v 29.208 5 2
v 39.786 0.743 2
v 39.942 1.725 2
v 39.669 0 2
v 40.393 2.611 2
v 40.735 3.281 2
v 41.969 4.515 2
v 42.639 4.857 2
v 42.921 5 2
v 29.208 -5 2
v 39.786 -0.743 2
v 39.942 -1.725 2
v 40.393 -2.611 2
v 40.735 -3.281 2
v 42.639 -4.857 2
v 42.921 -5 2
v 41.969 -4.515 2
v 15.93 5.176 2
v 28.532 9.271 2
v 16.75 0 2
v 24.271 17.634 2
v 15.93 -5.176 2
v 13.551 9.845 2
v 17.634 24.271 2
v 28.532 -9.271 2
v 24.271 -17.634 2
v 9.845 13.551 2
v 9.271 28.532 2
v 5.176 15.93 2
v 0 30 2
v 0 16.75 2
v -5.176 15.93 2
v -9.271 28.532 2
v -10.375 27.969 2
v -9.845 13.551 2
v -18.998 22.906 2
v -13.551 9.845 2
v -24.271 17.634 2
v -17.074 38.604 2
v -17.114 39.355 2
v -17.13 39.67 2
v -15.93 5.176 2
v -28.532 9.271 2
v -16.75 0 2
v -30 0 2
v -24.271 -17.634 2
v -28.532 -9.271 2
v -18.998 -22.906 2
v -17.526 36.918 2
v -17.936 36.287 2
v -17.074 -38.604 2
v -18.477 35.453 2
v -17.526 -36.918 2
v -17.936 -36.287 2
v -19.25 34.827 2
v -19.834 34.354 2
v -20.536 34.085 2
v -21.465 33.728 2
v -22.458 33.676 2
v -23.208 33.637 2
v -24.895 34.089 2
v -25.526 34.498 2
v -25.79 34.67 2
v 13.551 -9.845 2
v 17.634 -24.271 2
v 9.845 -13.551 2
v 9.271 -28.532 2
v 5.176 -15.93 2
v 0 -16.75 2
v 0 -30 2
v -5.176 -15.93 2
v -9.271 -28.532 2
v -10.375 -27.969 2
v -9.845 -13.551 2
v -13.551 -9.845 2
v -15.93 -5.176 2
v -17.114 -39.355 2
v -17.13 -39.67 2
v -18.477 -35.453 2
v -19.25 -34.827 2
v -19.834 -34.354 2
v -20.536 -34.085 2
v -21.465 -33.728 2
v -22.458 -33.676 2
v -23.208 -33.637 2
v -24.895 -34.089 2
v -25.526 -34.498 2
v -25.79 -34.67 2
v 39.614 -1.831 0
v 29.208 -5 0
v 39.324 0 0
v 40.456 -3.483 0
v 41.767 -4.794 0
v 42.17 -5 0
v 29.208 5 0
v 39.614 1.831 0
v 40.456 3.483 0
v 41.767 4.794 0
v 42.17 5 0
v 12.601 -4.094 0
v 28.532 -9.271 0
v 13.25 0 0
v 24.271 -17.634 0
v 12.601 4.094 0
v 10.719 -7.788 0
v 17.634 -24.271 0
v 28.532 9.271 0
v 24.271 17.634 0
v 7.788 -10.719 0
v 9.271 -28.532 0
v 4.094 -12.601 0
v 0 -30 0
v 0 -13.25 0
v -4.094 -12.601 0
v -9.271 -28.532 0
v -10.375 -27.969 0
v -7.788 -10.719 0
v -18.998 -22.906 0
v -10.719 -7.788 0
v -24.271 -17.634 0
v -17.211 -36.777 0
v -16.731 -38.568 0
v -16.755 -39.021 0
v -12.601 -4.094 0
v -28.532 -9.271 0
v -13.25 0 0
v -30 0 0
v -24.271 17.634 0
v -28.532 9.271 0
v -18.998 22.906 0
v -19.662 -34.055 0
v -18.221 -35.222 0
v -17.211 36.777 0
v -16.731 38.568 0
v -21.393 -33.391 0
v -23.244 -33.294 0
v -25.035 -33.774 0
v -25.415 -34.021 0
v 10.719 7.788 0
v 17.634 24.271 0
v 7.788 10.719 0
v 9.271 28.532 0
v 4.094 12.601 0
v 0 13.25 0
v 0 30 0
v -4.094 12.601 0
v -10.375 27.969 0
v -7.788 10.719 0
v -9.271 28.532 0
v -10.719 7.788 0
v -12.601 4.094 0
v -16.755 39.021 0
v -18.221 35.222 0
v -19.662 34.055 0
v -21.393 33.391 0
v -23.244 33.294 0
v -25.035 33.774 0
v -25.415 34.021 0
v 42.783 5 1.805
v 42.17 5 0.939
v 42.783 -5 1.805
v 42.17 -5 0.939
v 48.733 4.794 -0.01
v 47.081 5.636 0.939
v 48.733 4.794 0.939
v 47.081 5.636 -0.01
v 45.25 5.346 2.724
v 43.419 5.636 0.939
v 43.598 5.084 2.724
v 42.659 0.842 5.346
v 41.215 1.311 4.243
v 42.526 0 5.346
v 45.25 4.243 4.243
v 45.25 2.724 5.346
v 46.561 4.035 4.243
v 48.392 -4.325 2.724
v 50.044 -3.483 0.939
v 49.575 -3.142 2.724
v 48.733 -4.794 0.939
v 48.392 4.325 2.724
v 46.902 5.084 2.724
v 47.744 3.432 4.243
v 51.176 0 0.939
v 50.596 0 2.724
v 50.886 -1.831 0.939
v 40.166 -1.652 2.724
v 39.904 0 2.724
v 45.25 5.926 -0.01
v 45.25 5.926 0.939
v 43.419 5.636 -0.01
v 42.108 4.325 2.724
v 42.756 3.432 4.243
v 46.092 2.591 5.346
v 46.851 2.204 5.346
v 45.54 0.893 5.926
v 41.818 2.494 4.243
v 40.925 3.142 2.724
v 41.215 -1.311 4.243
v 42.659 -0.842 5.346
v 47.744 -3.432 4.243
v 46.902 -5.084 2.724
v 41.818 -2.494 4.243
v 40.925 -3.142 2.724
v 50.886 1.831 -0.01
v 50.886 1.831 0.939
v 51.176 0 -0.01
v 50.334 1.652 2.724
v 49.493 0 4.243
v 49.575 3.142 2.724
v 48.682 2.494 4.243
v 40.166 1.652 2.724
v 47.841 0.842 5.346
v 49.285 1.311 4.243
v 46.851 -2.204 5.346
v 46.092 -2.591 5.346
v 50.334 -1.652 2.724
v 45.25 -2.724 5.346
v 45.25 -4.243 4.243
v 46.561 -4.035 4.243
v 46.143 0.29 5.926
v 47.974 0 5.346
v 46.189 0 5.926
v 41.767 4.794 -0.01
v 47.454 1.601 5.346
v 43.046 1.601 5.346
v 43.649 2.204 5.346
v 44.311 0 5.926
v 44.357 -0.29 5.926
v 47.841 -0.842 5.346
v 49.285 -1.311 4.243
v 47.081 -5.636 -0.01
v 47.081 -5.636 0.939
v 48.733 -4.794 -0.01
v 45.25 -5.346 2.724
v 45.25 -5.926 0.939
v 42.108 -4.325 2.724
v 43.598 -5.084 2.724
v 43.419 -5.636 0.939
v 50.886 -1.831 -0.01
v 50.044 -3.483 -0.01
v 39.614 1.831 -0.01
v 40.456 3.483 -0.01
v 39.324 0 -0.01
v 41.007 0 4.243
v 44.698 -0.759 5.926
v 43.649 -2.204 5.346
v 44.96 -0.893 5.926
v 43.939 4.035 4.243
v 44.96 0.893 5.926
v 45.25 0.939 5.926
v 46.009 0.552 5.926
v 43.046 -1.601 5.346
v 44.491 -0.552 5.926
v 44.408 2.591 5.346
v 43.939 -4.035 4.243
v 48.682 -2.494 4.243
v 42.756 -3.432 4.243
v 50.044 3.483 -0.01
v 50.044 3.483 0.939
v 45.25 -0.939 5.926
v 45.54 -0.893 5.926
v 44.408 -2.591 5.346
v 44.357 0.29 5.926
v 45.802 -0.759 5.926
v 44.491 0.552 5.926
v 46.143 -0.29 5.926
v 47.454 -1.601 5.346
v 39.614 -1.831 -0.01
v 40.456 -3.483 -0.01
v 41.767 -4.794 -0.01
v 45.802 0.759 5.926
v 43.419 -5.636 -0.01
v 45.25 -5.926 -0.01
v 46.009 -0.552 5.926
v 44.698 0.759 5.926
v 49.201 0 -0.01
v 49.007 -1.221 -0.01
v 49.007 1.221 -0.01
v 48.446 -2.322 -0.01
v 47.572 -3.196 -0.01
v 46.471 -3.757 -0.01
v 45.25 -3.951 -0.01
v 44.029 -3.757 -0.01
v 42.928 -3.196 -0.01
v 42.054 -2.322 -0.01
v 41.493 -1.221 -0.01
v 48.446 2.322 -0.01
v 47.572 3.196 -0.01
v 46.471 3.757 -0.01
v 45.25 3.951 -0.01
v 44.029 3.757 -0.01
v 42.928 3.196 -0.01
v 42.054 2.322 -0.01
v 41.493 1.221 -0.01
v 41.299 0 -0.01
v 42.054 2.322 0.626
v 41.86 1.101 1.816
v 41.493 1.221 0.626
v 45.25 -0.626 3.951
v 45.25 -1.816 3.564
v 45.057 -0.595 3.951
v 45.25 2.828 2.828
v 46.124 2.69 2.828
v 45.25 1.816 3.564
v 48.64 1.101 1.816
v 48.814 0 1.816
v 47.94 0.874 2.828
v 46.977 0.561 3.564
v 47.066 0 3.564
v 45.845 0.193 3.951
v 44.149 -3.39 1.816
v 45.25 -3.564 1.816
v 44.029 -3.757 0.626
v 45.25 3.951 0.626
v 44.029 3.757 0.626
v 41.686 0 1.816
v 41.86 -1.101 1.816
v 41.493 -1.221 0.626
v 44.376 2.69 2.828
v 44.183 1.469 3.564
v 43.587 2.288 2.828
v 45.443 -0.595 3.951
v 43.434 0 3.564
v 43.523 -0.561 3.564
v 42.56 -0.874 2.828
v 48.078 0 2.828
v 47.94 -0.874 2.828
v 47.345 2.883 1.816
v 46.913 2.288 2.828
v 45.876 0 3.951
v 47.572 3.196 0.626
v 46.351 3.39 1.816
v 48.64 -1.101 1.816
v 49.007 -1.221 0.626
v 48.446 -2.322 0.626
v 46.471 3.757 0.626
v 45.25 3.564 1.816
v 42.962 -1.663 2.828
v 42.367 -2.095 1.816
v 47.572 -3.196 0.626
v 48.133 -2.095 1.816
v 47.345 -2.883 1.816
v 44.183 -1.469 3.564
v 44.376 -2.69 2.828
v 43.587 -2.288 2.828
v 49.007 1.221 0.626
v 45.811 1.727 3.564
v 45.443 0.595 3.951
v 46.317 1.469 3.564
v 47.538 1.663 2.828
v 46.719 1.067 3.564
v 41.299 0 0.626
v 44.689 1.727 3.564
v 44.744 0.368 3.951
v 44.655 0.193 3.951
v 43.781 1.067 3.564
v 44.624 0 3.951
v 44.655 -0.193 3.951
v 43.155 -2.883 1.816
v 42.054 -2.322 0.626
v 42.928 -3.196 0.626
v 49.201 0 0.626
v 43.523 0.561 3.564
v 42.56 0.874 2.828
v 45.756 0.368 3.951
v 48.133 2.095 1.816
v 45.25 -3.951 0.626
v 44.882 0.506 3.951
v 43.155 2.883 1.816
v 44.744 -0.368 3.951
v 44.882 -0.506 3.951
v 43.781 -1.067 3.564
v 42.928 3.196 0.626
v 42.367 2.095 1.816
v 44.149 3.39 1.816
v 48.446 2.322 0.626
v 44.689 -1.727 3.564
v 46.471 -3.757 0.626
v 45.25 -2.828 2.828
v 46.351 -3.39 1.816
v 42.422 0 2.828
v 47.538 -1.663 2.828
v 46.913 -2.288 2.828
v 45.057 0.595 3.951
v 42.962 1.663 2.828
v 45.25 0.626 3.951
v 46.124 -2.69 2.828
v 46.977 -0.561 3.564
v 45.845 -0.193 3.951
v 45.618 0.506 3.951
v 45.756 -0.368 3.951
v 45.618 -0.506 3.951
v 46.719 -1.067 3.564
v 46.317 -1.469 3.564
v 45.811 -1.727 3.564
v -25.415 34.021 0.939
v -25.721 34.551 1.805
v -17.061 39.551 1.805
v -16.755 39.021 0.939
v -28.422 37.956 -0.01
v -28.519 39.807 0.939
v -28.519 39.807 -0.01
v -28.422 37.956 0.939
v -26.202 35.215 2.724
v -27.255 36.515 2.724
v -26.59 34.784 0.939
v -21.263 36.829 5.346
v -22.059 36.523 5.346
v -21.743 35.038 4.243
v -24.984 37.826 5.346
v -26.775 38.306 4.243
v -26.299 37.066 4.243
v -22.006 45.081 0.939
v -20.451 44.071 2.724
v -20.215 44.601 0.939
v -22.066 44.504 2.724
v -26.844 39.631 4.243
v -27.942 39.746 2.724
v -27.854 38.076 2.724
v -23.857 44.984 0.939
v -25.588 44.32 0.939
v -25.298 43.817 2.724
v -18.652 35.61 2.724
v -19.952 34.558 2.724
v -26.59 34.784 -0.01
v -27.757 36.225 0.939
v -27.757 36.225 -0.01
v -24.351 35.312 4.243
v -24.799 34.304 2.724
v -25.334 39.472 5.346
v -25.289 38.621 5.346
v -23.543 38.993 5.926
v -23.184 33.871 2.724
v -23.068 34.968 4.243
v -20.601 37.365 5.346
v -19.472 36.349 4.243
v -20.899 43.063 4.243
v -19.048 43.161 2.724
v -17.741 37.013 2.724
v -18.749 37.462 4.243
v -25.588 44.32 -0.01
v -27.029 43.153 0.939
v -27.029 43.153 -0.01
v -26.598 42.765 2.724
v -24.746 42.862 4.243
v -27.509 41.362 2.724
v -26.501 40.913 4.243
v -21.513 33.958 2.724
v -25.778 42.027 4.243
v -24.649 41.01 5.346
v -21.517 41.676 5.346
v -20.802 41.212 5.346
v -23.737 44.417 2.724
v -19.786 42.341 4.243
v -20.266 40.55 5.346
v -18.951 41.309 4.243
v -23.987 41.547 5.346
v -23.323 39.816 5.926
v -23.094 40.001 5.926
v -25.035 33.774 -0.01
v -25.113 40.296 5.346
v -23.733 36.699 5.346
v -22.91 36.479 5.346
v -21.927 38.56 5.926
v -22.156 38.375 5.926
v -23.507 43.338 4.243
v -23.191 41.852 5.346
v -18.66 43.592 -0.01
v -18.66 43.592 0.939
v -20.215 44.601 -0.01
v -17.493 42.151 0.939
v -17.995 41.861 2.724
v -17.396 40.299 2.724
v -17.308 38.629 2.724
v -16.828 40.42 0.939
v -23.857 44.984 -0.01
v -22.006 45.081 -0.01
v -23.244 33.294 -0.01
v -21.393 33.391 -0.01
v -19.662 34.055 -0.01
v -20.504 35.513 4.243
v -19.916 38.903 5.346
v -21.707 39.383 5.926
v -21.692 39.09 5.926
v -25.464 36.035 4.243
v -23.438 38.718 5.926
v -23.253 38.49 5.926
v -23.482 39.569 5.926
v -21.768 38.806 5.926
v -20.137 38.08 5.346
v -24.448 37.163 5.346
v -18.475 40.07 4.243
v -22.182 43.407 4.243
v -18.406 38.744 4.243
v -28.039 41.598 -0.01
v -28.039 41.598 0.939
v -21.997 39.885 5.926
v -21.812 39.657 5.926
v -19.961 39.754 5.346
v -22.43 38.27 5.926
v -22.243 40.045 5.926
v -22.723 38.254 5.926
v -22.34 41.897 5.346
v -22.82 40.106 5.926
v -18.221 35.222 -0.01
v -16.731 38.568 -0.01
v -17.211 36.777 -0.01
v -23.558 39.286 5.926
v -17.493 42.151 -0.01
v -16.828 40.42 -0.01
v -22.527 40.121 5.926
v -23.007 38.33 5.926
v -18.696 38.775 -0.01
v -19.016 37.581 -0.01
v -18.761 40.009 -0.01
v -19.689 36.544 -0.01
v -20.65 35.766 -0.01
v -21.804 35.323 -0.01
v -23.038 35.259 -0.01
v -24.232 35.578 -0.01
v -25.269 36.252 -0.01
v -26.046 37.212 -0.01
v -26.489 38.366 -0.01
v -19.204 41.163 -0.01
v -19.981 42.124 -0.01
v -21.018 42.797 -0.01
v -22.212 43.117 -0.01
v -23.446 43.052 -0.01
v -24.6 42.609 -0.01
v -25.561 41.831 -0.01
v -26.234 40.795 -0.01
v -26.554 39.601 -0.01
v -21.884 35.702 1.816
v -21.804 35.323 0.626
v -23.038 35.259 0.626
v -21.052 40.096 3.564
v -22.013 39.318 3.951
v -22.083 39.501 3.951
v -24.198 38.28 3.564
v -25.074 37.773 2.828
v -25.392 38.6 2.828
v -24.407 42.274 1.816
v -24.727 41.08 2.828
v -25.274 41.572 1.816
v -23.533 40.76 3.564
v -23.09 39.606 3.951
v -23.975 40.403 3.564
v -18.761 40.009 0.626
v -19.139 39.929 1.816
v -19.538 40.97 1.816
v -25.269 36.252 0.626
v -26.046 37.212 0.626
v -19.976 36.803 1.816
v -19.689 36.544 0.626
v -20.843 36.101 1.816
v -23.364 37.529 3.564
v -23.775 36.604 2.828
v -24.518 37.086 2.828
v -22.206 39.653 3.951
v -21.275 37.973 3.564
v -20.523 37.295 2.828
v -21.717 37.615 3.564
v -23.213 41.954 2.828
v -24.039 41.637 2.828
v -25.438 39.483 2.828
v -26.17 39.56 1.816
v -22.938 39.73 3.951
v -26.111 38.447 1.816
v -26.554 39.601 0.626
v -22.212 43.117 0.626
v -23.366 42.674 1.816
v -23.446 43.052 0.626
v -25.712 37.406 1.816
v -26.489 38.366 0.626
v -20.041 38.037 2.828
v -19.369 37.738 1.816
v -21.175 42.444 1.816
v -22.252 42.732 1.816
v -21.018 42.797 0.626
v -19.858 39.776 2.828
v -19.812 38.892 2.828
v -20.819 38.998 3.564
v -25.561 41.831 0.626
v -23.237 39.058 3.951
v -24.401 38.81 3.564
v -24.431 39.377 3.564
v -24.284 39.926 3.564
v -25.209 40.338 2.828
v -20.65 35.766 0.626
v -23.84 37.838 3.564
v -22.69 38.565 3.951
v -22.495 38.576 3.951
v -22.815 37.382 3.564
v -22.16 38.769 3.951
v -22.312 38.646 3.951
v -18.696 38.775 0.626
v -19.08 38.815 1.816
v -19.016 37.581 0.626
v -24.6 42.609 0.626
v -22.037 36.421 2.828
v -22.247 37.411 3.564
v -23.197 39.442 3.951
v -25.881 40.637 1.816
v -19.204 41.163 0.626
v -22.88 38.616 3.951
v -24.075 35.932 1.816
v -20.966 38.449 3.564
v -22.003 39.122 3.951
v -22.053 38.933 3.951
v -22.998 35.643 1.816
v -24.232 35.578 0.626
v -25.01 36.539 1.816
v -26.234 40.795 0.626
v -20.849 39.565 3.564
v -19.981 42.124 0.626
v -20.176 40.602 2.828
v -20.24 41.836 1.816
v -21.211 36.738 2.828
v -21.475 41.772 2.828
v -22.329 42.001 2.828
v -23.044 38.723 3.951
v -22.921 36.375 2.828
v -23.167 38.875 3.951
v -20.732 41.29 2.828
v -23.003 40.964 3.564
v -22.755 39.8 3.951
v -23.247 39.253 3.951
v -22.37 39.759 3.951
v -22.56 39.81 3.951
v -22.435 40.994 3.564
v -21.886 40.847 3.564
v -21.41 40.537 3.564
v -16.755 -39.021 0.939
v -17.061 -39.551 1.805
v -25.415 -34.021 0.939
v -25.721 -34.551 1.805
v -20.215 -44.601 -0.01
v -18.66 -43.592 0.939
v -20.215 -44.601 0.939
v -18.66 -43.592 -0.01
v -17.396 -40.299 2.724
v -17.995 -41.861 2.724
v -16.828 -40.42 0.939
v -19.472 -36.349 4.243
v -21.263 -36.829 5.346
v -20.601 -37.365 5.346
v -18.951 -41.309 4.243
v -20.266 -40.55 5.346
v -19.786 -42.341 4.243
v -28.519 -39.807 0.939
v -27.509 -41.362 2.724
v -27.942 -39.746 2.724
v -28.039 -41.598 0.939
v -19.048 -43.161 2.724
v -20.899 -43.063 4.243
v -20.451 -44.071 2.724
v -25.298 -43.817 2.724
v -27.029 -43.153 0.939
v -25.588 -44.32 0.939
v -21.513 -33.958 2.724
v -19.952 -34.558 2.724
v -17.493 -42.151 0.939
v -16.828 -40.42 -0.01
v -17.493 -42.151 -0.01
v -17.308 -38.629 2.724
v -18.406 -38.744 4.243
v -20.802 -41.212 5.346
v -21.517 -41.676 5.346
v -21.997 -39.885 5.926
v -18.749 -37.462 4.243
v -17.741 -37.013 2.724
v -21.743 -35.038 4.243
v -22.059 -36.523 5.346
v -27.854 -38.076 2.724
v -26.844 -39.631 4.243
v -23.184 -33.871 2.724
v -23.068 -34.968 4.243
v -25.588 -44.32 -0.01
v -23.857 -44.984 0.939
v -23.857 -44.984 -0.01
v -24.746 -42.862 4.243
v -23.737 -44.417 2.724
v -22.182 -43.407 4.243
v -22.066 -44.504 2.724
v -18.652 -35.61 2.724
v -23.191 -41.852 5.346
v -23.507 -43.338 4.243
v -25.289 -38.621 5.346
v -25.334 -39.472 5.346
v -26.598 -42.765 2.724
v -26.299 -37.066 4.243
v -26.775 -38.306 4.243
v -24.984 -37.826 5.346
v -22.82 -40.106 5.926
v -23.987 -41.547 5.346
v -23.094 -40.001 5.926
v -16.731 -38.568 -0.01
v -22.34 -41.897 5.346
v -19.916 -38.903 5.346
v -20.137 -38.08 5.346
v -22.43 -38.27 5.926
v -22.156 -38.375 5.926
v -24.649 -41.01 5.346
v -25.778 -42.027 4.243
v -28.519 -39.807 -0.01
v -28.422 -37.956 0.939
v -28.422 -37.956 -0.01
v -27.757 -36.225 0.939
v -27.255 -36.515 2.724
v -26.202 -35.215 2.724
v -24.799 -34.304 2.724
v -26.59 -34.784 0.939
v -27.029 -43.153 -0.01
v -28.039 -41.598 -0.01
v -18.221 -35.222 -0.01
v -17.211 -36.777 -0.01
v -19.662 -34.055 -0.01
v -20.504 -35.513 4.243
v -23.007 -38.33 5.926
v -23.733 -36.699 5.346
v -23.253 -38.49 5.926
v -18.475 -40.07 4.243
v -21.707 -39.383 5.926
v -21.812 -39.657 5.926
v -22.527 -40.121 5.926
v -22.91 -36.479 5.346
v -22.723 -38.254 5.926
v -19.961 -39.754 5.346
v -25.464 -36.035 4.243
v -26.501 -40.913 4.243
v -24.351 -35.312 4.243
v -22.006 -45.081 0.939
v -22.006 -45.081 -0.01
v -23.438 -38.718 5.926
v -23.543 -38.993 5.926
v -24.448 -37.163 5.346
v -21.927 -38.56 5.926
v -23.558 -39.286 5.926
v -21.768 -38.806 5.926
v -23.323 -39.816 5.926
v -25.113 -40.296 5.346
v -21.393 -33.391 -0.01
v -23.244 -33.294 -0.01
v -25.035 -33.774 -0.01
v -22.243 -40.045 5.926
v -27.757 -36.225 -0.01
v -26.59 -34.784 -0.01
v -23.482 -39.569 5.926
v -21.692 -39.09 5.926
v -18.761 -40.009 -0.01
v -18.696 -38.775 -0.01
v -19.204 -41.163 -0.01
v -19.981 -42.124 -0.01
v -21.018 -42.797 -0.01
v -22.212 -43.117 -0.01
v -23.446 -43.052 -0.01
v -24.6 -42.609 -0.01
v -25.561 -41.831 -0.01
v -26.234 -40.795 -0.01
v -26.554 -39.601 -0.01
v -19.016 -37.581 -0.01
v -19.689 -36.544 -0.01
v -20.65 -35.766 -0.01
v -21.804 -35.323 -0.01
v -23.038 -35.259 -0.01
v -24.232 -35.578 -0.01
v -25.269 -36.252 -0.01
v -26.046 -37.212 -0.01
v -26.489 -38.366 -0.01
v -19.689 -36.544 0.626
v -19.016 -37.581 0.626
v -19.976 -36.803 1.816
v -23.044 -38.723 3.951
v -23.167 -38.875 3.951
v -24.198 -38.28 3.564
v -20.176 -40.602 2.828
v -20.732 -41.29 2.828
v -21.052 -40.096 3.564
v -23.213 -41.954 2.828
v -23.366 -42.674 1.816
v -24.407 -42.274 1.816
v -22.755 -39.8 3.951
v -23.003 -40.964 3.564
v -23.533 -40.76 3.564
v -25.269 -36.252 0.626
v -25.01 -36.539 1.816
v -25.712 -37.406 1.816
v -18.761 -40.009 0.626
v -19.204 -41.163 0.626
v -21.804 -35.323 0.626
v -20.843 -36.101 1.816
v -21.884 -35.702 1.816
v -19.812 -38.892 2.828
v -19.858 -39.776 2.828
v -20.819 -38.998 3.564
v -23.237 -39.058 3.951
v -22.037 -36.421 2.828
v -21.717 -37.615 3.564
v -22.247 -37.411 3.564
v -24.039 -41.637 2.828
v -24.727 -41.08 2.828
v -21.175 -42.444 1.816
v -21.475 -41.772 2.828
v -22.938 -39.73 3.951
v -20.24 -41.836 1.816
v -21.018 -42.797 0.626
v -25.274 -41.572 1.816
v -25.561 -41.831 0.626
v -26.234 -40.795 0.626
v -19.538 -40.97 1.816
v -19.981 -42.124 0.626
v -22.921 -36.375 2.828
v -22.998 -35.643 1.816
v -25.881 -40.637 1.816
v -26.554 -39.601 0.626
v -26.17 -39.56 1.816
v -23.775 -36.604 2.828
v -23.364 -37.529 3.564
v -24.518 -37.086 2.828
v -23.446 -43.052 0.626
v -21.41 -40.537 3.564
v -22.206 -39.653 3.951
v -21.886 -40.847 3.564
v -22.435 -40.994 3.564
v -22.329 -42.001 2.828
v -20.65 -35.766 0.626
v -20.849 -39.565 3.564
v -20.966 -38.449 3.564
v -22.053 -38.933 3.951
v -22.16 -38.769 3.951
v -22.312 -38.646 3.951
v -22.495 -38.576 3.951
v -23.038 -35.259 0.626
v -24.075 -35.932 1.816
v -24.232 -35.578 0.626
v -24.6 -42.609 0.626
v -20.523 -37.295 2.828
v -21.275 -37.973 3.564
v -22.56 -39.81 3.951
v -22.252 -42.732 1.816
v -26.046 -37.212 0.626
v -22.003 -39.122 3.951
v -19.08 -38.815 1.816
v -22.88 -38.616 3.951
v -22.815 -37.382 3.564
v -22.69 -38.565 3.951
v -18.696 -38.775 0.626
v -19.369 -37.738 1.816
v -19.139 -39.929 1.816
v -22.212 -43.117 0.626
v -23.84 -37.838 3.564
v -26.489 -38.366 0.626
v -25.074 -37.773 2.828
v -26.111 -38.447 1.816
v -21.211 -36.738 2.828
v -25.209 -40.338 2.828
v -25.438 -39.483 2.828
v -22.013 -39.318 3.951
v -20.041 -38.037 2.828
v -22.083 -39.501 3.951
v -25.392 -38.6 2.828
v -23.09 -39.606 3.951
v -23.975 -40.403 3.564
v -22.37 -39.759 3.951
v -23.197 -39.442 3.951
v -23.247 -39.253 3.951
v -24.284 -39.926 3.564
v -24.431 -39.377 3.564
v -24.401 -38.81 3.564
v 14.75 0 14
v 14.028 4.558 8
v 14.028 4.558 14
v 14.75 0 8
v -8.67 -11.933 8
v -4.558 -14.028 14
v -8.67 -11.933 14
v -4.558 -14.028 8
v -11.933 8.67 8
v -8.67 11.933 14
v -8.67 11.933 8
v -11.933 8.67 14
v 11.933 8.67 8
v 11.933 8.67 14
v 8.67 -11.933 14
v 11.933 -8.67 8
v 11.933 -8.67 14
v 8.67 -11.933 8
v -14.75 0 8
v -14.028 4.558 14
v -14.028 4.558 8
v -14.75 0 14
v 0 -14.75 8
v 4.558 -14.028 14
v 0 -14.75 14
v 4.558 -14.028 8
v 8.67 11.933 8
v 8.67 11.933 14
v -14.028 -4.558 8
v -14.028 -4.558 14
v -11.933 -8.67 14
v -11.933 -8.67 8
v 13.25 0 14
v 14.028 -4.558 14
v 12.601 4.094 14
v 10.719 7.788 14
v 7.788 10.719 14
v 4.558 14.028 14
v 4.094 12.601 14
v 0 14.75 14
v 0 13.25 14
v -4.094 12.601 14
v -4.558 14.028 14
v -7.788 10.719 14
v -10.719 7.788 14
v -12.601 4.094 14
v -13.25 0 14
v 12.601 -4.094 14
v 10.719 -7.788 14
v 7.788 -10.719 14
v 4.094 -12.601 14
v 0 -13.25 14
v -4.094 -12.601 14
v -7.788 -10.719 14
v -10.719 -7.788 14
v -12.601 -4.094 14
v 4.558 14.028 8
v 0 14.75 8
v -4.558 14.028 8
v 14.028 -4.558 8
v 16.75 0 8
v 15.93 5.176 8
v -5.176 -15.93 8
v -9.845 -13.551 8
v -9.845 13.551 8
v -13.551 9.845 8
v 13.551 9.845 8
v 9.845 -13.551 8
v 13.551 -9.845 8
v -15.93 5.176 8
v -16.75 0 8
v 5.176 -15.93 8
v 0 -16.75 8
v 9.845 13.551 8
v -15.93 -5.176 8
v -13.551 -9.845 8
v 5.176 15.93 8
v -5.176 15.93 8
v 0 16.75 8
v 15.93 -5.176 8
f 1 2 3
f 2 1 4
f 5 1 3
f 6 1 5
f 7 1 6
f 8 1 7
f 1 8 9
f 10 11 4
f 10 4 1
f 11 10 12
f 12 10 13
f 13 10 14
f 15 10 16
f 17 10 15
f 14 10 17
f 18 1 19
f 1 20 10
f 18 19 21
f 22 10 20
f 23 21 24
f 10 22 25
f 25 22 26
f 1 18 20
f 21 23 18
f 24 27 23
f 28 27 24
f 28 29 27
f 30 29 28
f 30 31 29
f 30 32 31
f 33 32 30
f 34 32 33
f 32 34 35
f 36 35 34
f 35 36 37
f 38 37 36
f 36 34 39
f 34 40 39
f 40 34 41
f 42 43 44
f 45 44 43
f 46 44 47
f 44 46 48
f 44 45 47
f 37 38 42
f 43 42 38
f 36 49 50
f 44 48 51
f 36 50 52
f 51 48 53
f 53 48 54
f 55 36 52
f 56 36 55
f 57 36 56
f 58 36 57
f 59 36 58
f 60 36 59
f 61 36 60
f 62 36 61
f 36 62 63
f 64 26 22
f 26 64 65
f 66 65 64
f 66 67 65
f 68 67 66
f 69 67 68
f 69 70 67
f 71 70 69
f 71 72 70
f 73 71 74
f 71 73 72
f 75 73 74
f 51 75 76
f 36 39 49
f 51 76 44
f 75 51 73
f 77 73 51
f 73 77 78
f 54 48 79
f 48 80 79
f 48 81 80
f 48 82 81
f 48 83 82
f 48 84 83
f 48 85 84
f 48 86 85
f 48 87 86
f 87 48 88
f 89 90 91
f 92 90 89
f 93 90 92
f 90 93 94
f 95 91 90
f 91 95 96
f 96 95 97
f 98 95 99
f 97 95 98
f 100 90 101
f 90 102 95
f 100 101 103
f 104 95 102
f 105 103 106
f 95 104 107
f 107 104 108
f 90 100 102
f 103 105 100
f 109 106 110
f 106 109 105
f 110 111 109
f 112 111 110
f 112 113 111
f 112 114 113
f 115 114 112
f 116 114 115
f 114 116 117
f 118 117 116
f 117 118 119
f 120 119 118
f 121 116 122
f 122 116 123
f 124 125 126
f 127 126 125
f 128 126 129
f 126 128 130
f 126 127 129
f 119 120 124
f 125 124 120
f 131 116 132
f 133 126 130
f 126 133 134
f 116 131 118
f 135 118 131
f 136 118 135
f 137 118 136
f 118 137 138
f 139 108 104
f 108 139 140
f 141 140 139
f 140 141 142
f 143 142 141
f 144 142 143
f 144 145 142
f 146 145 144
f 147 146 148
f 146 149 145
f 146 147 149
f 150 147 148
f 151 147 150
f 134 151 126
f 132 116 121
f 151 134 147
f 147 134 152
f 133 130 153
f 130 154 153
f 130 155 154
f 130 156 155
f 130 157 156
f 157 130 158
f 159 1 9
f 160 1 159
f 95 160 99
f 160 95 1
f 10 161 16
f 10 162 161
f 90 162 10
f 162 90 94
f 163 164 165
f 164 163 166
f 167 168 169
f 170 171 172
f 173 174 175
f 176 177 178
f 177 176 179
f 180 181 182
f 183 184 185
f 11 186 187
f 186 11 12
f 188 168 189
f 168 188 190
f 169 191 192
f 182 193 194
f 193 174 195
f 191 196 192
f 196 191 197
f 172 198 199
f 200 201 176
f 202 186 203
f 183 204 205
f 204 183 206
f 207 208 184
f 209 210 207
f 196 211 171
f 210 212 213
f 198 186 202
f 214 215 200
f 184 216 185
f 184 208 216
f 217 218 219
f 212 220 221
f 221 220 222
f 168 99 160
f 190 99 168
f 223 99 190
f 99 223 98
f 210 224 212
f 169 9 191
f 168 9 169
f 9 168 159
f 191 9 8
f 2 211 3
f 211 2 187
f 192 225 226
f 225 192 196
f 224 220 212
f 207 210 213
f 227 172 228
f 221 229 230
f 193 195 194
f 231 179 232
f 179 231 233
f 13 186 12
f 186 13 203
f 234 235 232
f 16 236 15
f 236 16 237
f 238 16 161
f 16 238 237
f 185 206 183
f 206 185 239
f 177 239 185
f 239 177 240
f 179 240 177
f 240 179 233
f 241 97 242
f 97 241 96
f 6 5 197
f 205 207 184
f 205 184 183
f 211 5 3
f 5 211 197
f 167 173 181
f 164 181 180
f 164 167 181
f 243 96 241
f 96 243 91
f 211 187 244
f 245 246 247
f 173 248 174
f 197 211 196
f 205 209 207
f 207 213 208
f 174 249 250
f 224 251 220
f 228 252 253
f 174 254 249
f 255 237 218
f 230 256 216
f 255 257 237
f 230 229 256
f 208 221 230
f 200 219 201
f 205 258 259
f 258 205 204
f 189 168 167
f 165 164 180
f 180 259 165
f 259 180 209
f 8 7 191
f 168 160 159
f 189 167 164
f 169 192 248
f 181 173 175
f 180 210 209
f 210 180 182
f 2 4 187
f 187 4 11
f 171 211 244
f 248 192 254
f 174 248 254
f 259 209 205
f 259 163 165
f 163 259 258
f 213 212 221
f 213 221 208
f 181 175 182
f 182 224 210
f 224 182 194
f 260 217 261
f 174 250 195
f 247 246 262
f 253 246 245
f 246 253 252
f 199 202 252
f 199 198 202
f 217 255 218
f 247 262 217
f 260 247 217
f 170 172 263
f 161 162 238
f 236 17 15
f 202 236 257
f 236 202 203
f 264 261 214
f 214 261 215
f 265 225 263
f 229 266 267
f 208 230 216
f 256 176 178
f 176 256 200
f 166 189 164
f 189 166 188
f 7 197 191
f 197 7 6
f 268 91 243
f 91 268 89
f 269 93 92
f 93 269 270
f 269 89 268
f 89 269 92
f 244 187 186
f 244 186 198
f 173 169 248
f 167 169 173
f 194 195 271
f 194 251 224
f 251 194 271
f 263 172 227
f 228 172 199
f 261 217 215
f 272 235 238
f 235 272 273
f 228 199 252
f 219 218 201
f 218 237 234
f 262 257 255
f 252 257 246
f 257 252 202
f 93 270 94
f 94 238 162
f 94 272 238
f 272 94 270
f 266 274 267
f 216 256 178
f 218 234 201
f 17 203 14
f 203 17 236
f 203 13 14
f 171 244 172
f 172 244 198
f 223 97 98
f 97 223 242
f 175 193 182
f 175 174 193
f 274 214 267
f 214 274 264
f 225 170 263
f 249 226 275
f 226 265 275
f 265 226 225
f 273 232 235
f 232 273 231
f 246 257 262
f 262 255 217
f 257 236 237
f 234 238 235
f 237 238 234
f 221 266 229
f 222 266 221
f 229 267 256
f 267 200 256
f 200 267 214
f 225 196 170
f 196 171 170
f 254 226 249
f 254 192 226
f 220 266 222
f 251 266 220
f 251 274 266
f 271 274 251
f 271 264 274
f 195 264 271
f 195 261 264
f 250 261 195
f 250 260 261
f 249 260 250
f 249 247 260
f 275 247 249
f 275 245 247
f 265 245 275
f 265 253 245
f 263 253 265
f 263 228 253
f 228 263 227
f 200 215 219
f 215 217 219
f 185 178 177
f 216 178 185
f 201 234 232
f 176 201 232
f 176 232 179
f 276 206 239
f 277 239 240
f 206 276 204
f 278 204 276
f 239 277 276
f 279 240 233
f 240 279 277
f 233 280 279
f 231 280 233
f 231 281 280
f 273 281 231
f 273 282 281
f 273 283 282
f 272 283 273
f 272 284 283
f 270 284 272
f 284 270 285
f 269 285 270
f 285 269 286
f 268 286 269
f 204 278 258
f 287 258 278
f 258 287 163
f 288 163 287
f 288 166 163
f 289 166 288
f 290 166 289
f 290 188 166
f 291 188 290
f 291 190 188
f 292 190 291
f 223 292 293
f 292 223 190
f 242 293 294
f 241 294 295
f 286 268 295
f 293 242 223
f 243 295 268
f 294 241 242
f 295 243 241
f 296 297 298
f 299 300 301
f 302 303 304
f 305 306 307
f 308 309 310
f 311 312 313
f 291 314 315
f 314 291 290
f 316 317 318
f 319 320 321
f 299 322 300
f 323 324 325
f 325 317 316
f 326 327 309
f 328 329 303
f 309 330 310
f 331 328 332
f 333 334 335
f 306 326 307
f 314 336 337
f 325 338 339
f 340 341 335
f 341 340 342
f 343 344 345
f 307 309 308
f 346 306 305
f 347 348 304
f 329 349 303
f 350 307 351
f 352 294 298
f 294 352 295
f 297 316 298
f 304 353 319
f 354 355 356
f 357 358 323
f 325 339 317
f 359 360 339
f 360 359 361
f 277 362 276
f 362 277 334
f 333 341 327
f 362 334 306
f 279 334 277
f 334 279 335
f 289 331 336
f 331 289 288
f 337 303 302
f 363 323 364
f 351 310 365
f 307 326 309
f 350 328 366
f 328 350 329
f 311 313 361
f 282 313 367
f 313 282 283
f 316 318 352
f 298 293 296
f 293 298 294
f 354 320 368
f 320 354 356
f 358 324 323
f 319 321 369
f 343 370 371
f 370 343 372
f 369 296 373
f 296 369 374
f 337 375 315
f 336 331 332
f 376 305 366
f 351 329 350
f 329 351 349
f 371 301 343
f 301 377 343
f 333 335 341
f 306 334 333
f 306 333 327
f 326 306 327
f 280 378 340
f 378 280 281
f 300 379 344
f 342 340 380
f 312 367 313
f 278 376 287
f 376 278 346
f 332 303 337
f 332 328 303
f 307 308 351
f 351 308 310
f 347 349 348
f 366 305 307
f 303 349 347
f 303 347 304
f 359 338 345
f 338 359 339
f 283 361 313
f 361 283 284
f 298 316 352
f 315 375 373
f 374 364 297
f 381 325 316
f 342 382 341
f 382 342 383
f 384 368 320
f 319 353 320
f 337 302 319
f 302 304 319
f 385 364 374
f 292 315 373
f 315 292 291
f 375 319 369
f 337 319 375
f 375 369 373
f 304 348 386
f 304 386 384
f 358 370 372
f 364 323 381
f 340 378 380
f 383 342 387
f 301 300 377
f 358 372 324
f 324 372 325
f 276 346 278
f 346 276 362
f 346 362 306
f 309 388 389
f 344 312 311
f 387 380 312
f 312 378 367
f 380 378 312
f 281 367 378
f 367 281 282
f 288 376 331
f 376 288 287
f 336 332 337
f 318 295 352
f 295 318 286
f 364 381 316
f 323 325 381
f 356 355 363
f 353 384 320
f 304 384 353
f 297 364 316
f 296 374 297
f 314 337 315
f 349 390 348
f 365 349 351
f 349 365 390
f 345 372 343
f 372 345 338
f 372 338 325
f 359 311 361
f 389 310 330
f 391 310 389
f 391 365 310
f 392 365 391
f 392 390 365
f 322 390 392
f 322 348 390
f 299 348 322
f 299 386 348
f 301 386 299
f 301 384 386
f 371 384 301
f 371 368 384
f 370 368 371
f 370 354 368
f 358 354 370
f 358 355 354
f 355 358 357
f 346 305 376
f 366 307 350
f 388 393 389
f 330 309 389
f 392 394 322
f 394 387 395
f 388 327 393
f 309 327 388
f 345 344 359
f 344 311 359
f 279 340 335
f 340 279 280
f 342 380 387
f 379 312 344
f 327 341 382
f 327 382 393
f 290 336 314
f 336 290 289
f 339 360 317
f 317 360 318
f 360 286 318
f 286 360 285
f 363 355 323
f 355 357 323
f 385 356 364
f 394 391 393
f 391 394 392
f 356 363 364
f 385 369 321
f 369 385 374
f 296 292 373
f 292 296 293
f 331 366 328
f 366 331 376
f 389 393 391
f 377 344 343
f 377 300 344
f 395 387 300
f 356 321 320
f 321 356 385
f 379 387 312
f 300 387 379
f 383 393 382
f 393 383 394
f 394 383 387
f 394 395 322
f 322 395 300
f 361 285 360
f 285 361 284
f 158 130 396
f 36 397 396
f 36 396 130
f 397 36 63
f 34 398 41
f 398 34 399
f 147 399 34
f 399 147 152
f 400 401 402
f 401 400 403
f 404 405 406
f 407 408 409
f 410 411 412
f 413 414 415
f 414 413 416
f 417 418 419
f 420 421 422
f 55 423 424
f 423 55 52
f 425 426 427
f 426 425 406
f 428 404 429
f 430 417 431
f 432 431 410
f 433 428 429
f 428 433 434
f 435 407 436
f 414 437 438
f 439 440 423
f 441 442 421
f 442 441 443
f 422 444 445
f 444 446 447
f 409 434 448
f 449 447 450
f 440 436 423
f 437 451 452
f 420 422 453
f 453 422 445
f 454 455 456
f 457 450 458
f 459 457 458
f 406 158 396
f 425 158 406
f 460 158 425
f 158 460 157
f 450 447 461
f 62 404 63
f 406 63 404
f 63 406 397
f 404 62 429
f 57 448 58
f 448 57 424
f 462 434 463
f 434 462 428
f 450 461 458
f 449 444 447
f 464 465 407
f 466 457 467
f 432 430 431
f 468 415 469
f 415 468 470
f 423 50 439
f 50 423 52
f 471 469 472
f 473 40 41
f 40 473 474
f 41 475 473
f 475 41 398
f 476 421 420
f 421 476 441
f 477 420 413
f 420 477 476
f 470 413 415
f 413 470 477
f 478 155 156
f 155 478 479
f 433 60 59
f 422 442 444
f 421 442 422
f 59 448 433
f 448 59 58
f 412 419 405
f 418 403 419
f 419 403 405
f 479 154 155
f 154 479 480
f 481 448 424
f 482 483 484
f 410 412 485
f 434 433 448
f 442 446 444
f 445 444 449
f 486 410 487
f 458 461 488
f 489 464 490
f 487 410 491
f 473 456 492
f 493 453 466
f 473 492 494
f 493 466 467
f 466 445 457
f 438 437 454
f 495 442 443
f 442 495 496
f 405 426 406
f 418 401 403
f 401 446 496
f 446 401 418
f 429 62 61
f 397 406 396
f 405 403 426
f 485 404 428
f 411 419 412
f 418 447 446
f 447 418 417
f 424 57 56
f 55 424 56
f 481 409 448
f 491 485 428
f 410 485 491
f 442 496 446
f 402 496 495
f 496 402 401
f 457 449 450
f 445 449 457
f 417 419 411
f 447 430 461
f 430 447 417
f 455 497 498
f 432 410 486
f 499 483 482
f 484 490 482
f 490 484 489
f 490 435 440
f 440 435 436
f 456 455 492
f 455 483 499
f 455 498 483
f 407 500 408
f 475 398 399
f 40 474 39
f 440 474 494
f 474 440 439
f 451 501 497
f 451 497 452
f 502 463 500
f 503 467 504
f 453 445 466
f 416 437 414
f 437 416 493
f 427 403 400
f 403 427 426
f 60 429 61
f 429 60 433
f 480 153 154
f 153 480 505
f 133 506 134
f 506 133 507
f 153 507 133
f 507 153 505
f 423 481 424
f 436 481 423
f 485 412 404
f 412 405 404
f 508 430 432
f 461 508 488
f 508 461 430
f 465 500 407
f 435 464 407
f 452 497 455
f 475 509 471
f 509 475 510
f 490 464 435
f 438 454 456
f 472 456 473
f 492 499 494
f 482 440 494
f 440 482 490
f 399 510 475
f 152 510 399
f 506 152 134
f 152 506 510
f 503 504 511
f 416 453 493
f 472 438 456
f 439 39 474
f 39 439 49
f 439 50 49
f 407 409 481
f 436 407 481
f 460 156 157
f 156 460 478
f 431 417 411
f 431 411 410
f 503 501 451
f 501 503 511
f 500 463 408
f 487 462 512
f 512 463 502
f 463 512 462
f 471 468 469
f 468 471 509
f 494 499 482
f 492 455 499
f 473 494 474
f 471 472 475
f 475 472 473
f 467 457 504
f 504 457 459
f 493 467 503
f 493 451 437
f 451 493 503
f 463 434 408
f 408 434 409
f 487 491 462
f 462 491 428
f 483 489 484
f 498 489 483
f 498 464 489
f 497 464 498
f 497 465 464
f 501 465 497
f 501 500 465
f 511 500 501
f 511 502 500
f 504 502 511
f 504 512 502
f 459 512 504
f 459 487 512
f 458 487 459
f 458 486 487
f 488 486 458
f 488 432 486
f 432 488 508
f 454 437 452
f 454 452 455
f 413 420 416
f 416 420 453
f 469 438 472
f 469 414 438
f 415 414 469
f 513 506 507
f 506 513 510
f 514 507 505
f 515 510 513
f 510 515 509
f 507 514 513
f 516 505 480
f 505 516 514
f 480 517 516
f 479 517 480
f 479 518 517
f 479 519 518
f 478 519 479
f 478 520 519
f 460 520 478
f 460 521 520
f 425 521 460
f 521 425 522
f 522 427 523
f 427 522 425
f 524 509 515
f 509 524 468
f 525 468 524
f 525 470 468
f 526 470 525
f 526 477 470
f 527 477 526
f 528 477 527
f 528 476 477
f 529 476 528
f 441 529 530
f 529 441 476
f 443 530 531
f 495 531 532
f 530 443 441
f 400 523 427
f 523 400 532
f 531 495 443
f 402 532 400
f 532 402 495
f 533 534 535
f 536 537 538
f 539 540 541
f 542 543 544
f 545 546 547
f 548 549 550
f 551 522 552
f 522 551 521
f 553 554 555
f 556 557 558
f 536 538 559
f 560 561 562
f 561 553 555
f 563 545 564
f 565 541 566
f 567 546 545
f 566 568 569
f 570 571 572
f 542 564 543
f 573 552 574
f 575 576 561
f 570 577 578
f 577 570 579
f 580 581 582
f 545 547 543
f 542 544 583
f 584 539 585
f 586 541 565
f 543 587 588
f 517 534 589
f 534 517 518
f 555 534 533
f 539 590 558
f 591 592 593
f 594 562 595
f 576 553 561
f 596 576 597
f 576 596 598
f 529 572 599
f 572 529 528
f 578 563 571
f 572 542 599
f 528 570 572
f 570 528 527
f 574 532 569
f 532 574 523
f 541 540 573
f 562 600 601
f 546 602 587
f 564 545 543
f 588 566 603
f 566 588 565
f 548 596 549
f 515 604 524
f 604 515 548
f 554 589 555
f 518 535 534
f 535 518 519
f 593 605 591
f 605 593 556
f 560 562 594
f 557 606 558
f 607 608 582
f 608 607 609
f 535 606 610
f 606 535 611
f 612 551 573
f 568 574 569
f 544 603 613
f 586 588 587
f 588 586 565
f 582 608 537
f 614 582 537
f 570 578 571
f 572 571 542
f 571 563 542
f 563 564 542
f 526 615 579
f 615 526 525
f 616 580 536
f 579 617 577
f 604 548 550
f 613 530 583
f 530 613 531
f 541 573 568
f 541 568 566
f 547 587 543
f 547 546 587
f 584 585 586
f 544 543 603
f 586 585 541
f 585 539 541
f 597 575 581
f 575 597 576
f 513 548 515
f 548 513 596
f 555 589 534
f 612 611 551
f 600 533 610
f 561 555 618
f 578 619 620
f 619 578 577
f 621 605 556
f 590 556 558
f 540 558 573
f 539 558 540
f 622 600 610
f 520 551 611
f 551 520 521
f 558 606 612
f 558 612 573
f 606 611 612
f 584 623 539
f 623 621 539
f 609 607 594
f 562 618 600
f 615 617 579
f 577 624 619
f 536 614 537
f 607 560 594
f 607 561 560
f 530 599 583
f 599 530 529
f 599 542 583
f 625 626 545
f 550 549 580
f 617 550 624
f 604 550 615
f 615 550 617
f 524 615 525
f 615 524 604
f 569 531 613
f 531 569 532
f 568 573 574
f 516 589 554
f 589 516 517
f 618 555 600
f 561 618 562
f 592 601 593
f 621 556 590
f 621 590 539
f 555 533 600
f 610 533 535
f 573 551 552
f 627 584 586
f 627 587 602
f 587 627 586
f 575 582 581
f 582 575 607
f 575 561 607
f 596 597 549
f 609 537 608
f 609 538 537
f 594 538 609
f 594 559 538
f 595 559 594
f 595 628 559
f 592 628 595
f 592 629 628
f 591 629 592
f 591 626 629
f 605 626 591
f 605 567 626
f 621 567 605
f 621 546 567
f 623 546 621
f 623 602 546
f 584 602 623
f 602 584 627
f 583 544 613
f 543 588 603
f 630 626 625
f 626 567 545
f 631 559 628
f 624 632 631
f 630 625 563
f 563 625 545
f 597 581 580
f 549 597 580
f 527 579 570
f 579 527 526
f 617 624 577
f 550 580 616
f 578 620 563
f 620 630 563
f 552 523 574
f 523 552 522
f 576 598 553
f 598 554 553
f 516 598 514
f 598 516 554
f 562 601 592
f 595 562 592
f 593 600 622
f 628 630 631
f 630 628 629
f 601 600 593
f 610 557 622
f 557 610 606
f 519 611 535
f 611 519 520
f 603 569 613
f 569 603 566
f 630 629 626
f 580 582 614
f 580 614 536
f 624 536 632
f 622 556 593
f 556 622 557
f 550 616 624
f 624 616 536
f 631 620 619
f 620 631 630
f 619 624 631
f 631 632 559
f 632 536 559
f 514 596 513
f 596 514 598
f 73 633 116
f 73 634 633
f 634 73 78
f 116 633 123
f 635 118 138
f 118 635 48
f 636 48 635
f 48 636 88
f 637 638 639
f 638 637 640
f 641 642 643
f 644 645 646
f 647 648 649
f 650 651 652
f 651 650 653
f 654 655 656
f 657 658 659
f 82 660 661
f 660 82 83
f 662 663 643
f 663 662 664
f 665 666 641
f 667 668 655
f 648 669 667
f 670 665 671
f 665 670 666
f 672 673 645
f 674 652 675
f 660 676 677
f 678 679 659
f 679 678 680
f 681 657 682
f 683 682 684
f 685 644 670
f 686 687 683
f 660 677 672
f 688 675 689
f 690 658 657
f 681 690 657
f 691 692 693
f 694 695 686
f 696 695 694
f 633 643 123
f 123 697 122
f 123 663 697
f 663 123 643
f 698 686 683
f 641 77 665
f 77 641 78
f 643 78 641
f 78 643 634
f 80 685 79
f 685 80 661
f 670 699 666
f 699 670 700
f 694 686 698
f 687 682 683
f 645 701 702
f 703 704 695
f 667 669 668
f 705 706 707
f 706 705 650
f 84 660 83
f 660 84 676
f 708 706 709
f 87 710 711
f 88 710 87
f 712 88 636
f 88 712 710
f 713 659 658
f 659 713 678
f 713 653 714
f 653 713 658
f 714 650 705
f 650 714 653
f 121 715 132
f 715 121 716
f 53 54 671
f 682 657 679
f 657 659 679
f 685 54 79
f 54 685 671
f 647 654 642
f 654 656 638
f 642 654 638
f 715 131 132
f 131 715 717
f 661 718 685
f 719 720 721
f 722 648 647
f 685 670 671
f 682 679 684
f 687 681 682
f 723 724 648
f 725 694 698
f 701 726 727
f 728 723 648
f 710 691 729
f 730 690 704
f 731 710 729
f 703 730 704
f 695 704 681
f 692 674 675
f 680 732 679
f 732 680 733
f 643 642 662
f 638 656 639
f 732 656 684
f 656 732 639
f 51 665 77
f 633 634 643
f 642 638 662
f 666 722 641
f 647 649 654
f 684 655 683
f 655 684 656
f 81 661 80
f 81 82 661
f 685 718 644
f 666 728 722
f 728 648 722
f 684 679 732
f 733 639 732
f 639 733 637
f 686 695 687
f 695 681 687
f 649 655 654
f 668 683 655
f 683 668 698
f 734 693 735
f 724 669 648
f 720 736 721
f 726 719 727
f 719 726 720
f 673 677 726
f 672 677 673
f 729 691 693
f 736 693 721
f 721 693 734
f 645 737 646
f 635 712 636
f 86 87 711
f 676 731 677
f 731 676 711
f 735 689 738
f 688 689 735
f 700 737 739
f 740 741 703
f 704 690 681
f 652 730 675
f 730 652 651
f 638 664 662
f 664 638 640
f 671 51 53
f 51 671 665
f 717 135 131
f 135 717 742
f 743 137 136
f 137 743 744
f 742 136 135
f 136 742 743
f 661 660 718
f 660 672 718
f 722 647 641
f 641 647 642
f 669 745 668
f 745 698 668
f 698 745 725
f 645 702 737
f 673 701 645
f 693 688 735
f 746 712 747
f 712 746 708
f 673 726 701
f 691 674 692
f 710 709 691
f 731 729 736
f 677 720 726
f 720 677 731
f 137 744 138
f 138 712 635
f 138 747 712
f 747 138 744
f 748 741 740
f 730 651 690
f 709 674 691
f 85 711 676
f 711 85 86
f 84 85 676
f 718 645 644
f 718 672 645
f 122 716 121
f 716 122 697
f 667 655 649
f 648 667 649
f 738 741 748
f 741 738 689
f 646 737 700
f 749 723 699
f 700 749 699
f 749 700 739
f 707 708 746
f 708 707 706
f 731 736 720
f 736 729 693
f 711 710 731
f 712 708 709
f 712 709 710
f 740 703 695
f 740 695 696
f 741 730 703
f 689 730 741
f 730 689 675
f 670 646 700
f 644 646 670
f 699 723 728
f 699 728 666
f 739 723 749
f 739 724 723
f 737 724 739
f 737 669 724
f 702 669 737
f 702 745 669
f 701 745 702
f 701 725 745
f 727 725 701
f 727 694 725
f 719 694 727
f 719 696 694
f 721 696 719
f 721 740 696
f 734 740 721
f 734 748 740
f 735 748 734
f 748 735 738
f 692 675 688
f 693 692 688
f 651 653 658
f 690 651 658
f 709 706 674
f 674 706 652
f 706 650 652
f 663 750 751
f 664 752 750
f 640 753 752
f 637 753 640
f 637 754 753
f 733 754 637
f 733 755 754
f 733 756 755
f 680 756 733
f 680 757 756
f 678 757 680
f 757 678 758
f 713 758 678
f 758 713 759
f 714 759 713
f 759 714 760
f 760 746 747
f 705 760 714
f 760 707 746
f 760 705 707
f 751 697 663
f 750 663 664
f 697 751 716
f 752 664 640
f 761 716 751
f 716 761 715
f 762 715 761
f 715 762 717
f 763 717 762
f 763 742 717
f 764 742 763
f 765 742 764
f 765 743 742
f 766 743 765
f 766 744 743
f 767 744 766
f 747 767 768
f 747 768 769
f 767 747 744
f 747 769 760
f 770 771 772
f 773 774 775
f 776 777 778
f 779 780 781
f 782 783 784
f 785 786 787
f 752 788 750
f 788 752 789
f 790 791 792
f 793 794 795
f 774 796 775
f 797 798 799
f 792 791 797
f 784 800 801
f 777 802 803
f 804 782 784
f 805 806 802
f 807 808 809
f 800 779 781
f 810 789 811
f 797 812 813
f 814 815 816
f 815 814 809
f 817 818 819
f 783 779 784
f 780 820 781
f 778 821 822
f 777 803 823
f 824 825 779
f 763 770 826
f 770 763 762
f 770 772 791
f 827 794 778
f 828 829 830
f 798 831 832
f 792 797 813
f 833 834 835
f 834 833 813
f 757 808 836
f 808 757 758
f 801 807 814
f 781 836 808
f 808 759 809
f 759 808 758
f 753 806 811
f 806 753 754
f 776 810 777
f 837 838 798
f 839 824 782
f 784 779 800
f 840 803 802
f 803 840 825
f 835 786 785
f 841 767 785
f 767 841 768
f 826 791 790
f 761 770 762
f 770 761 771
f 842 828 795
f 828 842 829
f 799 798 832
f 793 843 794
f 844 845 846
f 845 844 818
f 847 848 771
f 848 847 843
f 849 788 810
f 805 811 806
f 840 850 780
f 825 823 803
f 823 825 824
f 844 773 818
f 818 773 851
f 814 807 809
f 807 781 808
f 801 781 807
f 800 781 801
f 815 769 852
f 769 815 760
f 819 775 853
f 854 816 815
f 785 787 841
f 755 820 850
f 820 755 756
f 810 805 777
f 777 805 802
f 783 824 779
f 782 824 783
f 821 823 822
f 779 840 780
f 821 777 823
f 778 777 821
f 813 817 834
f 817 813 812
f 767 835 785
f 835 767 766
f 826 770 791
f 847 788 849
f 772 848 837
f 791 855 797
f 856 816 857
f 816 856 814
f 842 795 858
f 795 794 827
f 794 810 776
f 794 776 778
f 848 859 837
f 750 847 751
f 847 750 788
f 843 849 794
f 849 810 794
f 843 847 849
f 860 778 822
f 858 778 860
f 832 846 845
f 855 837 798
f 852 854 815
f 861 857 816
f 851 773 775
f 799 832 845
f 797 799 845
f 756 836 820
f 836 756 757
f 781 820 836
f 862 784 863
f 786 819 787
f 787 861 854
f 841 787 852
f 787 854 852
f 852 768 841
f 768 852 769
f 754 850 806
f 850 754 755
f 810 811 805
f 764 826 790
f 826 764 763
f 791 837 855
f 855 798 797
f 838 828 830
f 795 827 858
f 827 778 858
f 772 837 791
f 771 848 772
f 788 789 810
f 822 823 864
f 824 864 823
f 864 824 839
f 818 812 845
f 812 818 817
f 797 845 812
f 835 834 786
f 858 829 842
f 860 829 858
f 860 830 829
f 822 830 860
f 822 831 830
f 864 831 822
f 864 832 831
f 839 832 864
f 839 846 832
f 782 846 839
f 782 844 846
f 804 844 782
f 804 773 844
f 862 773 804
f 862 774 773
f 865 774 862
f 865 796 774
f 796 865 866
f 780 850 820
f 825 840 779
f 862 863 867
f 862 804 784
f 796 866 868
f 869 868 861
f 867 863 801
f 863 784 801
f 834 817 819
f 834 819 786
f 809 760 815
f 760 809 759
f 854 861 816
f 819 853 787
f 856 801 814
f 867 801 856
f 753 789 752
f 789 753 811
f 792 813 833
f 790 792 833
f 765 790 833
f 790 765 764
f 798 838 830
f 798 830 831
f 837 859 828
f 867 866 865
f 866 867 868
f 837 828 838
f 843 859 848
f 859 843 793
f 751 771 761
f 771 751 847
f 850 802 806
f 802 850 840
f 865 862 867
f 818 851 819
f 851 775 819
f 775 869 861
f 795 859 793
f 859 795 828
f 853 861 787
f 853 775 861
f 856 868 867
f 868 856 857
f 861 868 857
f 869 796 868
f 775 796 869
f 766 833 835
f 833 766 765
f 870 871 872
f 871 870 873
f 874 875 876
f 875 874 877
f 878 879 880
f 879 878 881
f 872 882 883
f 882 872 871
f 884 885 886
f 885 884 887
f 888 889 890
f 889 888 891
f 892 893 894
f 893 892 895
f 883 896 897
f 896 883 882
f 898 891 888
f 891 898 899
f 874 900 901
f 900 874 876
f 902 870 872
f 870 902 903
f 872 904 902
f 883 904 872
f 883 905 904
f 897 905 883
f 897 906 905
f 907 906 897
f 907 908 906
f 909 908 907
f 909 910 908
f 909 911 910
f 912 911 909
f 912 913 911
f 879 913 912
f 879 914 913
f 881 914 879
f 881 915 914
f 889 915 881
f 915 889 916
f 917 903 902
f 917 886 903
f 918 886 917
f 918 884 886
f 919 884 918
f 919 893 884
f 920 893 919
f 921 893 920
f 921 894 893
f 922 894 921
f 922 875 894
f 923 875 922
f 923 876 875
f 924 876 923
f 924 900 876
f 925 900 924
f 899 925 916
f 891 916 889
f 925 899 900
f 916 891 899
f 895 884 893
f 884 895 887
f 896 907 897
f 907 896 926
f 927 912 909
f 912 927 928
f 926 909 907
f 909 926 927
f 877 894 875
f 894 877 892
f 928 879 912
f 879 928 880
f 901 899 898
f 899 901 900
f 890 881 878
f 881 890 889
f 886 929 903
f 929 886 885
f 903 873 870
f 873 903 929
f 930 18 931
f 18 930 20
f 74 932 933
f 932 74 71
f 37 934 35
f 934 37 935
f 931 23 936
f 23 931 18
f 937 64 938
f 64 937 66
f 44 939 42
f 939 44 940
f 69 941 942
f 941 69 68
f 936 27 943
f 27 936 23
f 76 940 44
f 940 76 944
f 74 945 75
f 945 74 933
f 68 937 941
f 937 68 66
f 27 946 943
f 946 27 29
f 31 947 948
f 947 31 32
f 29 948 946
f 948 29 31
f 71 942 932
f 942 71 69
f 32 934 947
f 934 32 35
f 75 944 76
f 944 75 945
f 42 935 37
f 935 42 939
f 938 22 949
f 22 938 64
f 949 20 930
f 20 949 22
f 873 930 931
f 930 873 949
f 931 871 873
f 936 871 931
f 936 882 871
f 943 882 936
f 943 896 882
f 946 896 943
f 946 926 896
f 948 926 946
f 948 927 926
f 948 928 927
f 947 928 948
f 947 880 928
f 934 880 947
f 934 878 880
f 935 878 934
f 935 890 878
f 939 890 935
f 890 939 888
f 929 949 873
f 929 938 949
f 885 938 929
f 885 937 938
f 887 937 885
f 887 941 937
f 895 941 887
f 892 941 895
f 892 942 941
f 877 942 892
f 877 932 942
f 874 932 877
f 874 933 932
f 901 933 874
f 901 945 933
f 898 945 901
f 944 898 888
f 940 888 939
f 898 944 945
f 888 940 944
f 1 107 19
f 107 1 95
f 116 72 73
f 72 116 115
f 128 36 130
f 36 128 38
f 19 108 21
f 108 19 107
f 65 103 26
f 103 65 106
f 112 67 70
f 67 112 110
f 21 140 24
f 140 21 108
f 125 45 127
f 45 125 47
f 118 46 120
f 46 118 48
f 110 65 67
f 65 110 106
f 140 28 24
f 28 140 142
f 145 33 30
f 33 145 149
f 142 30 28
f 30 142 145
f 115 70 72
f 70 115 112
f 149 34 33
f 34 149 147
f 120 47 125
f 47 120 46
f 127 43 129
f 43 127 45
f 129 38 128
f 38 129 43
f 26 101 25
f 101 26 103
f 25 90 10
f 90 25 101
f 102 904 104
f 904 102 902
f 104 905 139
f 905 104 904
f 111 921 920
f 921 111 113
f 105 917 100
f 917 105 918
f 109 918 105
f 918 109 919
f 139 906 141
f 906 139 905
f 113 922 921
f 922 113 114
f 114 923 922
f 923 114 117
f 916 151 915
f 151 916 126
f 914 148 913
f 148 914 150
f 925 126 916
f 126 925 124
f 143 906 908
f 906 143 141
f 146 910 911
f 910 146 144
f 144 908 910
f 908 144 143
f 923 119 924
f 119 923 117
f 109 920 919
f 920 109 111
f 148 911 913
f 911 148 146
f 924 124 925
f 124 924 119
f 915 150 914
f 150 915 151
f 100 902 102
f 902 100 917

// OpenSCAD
// Horizontal spool holder

// Generic constants

$fn = 20;
Delta = 0.01;
Big = 100;

// Constants for the UltiMachine 5lb spool

SpoolHoleRadius = 30.5 / 2;
SpoolHolePlay = 0.5;
SpoolHoldDepth = 4;

// Design constants

SpoolHolderThickness = 2;

PlateRadius = 30;
PlateThickness = 2;
PlateRimThickness = 2;

SpokeLength = SpoolHoleRadius + 30;
SpokeWidth = 10;
SpokeBallWidth = SpokeWidth / 2 + 1;

BottomGap = SpokeBallWidth;

// Calculated constants

TotalSpoolHolderHeight = PlateThickness + BottomGap  + PlateThickness + SpoolHoldDepth;

// Spool holder column
union()
{
	difference()
	{
		union()
		{
			// Main column
			cylinder(r = SpoolHoleRadius - SpoolHolePlay, h = TotalSpoolHolderHeight);
			
			// Plate rim
			cylinder(r = SpoolHoleRadius + PlateRimThickness - SpoolHolePlay, h = PlateThickness + BottomGap);
			
			// Plate base
			cylinder(r = PlateRadius, h = PlateRimThickness);

			// Spokes
			for (a = [0, 120, 240])
			rotate([0, 0, a])
			Spoke();

		}
		union()
		{
			// Central hole
			translate([0, 0, -Delta])
			cylinder(r = SpoolHoleRadius - SpoolHolderThickness, h = Big);
		}
	}
}

module Spoke()
{
	difference()
	{
		union()
		{
			translate([0, -SpokeWidth / 2, 0])
			cube(size=[SpokeLength, SpokeWidth, PlateThickness]);

			translate([SpokeLength, 0, 0])
			sphere(r = SpokeBallWidth);
		}
		union()
		{
			translate([0, -Big / 2, -Big])
			cube(size=[Big, Big, Big - Delta]);

			translate([SpokeLength, 0, 0])
			sphere(r = SpokeBallWidth - PlateThickness);
		}
	}
}
